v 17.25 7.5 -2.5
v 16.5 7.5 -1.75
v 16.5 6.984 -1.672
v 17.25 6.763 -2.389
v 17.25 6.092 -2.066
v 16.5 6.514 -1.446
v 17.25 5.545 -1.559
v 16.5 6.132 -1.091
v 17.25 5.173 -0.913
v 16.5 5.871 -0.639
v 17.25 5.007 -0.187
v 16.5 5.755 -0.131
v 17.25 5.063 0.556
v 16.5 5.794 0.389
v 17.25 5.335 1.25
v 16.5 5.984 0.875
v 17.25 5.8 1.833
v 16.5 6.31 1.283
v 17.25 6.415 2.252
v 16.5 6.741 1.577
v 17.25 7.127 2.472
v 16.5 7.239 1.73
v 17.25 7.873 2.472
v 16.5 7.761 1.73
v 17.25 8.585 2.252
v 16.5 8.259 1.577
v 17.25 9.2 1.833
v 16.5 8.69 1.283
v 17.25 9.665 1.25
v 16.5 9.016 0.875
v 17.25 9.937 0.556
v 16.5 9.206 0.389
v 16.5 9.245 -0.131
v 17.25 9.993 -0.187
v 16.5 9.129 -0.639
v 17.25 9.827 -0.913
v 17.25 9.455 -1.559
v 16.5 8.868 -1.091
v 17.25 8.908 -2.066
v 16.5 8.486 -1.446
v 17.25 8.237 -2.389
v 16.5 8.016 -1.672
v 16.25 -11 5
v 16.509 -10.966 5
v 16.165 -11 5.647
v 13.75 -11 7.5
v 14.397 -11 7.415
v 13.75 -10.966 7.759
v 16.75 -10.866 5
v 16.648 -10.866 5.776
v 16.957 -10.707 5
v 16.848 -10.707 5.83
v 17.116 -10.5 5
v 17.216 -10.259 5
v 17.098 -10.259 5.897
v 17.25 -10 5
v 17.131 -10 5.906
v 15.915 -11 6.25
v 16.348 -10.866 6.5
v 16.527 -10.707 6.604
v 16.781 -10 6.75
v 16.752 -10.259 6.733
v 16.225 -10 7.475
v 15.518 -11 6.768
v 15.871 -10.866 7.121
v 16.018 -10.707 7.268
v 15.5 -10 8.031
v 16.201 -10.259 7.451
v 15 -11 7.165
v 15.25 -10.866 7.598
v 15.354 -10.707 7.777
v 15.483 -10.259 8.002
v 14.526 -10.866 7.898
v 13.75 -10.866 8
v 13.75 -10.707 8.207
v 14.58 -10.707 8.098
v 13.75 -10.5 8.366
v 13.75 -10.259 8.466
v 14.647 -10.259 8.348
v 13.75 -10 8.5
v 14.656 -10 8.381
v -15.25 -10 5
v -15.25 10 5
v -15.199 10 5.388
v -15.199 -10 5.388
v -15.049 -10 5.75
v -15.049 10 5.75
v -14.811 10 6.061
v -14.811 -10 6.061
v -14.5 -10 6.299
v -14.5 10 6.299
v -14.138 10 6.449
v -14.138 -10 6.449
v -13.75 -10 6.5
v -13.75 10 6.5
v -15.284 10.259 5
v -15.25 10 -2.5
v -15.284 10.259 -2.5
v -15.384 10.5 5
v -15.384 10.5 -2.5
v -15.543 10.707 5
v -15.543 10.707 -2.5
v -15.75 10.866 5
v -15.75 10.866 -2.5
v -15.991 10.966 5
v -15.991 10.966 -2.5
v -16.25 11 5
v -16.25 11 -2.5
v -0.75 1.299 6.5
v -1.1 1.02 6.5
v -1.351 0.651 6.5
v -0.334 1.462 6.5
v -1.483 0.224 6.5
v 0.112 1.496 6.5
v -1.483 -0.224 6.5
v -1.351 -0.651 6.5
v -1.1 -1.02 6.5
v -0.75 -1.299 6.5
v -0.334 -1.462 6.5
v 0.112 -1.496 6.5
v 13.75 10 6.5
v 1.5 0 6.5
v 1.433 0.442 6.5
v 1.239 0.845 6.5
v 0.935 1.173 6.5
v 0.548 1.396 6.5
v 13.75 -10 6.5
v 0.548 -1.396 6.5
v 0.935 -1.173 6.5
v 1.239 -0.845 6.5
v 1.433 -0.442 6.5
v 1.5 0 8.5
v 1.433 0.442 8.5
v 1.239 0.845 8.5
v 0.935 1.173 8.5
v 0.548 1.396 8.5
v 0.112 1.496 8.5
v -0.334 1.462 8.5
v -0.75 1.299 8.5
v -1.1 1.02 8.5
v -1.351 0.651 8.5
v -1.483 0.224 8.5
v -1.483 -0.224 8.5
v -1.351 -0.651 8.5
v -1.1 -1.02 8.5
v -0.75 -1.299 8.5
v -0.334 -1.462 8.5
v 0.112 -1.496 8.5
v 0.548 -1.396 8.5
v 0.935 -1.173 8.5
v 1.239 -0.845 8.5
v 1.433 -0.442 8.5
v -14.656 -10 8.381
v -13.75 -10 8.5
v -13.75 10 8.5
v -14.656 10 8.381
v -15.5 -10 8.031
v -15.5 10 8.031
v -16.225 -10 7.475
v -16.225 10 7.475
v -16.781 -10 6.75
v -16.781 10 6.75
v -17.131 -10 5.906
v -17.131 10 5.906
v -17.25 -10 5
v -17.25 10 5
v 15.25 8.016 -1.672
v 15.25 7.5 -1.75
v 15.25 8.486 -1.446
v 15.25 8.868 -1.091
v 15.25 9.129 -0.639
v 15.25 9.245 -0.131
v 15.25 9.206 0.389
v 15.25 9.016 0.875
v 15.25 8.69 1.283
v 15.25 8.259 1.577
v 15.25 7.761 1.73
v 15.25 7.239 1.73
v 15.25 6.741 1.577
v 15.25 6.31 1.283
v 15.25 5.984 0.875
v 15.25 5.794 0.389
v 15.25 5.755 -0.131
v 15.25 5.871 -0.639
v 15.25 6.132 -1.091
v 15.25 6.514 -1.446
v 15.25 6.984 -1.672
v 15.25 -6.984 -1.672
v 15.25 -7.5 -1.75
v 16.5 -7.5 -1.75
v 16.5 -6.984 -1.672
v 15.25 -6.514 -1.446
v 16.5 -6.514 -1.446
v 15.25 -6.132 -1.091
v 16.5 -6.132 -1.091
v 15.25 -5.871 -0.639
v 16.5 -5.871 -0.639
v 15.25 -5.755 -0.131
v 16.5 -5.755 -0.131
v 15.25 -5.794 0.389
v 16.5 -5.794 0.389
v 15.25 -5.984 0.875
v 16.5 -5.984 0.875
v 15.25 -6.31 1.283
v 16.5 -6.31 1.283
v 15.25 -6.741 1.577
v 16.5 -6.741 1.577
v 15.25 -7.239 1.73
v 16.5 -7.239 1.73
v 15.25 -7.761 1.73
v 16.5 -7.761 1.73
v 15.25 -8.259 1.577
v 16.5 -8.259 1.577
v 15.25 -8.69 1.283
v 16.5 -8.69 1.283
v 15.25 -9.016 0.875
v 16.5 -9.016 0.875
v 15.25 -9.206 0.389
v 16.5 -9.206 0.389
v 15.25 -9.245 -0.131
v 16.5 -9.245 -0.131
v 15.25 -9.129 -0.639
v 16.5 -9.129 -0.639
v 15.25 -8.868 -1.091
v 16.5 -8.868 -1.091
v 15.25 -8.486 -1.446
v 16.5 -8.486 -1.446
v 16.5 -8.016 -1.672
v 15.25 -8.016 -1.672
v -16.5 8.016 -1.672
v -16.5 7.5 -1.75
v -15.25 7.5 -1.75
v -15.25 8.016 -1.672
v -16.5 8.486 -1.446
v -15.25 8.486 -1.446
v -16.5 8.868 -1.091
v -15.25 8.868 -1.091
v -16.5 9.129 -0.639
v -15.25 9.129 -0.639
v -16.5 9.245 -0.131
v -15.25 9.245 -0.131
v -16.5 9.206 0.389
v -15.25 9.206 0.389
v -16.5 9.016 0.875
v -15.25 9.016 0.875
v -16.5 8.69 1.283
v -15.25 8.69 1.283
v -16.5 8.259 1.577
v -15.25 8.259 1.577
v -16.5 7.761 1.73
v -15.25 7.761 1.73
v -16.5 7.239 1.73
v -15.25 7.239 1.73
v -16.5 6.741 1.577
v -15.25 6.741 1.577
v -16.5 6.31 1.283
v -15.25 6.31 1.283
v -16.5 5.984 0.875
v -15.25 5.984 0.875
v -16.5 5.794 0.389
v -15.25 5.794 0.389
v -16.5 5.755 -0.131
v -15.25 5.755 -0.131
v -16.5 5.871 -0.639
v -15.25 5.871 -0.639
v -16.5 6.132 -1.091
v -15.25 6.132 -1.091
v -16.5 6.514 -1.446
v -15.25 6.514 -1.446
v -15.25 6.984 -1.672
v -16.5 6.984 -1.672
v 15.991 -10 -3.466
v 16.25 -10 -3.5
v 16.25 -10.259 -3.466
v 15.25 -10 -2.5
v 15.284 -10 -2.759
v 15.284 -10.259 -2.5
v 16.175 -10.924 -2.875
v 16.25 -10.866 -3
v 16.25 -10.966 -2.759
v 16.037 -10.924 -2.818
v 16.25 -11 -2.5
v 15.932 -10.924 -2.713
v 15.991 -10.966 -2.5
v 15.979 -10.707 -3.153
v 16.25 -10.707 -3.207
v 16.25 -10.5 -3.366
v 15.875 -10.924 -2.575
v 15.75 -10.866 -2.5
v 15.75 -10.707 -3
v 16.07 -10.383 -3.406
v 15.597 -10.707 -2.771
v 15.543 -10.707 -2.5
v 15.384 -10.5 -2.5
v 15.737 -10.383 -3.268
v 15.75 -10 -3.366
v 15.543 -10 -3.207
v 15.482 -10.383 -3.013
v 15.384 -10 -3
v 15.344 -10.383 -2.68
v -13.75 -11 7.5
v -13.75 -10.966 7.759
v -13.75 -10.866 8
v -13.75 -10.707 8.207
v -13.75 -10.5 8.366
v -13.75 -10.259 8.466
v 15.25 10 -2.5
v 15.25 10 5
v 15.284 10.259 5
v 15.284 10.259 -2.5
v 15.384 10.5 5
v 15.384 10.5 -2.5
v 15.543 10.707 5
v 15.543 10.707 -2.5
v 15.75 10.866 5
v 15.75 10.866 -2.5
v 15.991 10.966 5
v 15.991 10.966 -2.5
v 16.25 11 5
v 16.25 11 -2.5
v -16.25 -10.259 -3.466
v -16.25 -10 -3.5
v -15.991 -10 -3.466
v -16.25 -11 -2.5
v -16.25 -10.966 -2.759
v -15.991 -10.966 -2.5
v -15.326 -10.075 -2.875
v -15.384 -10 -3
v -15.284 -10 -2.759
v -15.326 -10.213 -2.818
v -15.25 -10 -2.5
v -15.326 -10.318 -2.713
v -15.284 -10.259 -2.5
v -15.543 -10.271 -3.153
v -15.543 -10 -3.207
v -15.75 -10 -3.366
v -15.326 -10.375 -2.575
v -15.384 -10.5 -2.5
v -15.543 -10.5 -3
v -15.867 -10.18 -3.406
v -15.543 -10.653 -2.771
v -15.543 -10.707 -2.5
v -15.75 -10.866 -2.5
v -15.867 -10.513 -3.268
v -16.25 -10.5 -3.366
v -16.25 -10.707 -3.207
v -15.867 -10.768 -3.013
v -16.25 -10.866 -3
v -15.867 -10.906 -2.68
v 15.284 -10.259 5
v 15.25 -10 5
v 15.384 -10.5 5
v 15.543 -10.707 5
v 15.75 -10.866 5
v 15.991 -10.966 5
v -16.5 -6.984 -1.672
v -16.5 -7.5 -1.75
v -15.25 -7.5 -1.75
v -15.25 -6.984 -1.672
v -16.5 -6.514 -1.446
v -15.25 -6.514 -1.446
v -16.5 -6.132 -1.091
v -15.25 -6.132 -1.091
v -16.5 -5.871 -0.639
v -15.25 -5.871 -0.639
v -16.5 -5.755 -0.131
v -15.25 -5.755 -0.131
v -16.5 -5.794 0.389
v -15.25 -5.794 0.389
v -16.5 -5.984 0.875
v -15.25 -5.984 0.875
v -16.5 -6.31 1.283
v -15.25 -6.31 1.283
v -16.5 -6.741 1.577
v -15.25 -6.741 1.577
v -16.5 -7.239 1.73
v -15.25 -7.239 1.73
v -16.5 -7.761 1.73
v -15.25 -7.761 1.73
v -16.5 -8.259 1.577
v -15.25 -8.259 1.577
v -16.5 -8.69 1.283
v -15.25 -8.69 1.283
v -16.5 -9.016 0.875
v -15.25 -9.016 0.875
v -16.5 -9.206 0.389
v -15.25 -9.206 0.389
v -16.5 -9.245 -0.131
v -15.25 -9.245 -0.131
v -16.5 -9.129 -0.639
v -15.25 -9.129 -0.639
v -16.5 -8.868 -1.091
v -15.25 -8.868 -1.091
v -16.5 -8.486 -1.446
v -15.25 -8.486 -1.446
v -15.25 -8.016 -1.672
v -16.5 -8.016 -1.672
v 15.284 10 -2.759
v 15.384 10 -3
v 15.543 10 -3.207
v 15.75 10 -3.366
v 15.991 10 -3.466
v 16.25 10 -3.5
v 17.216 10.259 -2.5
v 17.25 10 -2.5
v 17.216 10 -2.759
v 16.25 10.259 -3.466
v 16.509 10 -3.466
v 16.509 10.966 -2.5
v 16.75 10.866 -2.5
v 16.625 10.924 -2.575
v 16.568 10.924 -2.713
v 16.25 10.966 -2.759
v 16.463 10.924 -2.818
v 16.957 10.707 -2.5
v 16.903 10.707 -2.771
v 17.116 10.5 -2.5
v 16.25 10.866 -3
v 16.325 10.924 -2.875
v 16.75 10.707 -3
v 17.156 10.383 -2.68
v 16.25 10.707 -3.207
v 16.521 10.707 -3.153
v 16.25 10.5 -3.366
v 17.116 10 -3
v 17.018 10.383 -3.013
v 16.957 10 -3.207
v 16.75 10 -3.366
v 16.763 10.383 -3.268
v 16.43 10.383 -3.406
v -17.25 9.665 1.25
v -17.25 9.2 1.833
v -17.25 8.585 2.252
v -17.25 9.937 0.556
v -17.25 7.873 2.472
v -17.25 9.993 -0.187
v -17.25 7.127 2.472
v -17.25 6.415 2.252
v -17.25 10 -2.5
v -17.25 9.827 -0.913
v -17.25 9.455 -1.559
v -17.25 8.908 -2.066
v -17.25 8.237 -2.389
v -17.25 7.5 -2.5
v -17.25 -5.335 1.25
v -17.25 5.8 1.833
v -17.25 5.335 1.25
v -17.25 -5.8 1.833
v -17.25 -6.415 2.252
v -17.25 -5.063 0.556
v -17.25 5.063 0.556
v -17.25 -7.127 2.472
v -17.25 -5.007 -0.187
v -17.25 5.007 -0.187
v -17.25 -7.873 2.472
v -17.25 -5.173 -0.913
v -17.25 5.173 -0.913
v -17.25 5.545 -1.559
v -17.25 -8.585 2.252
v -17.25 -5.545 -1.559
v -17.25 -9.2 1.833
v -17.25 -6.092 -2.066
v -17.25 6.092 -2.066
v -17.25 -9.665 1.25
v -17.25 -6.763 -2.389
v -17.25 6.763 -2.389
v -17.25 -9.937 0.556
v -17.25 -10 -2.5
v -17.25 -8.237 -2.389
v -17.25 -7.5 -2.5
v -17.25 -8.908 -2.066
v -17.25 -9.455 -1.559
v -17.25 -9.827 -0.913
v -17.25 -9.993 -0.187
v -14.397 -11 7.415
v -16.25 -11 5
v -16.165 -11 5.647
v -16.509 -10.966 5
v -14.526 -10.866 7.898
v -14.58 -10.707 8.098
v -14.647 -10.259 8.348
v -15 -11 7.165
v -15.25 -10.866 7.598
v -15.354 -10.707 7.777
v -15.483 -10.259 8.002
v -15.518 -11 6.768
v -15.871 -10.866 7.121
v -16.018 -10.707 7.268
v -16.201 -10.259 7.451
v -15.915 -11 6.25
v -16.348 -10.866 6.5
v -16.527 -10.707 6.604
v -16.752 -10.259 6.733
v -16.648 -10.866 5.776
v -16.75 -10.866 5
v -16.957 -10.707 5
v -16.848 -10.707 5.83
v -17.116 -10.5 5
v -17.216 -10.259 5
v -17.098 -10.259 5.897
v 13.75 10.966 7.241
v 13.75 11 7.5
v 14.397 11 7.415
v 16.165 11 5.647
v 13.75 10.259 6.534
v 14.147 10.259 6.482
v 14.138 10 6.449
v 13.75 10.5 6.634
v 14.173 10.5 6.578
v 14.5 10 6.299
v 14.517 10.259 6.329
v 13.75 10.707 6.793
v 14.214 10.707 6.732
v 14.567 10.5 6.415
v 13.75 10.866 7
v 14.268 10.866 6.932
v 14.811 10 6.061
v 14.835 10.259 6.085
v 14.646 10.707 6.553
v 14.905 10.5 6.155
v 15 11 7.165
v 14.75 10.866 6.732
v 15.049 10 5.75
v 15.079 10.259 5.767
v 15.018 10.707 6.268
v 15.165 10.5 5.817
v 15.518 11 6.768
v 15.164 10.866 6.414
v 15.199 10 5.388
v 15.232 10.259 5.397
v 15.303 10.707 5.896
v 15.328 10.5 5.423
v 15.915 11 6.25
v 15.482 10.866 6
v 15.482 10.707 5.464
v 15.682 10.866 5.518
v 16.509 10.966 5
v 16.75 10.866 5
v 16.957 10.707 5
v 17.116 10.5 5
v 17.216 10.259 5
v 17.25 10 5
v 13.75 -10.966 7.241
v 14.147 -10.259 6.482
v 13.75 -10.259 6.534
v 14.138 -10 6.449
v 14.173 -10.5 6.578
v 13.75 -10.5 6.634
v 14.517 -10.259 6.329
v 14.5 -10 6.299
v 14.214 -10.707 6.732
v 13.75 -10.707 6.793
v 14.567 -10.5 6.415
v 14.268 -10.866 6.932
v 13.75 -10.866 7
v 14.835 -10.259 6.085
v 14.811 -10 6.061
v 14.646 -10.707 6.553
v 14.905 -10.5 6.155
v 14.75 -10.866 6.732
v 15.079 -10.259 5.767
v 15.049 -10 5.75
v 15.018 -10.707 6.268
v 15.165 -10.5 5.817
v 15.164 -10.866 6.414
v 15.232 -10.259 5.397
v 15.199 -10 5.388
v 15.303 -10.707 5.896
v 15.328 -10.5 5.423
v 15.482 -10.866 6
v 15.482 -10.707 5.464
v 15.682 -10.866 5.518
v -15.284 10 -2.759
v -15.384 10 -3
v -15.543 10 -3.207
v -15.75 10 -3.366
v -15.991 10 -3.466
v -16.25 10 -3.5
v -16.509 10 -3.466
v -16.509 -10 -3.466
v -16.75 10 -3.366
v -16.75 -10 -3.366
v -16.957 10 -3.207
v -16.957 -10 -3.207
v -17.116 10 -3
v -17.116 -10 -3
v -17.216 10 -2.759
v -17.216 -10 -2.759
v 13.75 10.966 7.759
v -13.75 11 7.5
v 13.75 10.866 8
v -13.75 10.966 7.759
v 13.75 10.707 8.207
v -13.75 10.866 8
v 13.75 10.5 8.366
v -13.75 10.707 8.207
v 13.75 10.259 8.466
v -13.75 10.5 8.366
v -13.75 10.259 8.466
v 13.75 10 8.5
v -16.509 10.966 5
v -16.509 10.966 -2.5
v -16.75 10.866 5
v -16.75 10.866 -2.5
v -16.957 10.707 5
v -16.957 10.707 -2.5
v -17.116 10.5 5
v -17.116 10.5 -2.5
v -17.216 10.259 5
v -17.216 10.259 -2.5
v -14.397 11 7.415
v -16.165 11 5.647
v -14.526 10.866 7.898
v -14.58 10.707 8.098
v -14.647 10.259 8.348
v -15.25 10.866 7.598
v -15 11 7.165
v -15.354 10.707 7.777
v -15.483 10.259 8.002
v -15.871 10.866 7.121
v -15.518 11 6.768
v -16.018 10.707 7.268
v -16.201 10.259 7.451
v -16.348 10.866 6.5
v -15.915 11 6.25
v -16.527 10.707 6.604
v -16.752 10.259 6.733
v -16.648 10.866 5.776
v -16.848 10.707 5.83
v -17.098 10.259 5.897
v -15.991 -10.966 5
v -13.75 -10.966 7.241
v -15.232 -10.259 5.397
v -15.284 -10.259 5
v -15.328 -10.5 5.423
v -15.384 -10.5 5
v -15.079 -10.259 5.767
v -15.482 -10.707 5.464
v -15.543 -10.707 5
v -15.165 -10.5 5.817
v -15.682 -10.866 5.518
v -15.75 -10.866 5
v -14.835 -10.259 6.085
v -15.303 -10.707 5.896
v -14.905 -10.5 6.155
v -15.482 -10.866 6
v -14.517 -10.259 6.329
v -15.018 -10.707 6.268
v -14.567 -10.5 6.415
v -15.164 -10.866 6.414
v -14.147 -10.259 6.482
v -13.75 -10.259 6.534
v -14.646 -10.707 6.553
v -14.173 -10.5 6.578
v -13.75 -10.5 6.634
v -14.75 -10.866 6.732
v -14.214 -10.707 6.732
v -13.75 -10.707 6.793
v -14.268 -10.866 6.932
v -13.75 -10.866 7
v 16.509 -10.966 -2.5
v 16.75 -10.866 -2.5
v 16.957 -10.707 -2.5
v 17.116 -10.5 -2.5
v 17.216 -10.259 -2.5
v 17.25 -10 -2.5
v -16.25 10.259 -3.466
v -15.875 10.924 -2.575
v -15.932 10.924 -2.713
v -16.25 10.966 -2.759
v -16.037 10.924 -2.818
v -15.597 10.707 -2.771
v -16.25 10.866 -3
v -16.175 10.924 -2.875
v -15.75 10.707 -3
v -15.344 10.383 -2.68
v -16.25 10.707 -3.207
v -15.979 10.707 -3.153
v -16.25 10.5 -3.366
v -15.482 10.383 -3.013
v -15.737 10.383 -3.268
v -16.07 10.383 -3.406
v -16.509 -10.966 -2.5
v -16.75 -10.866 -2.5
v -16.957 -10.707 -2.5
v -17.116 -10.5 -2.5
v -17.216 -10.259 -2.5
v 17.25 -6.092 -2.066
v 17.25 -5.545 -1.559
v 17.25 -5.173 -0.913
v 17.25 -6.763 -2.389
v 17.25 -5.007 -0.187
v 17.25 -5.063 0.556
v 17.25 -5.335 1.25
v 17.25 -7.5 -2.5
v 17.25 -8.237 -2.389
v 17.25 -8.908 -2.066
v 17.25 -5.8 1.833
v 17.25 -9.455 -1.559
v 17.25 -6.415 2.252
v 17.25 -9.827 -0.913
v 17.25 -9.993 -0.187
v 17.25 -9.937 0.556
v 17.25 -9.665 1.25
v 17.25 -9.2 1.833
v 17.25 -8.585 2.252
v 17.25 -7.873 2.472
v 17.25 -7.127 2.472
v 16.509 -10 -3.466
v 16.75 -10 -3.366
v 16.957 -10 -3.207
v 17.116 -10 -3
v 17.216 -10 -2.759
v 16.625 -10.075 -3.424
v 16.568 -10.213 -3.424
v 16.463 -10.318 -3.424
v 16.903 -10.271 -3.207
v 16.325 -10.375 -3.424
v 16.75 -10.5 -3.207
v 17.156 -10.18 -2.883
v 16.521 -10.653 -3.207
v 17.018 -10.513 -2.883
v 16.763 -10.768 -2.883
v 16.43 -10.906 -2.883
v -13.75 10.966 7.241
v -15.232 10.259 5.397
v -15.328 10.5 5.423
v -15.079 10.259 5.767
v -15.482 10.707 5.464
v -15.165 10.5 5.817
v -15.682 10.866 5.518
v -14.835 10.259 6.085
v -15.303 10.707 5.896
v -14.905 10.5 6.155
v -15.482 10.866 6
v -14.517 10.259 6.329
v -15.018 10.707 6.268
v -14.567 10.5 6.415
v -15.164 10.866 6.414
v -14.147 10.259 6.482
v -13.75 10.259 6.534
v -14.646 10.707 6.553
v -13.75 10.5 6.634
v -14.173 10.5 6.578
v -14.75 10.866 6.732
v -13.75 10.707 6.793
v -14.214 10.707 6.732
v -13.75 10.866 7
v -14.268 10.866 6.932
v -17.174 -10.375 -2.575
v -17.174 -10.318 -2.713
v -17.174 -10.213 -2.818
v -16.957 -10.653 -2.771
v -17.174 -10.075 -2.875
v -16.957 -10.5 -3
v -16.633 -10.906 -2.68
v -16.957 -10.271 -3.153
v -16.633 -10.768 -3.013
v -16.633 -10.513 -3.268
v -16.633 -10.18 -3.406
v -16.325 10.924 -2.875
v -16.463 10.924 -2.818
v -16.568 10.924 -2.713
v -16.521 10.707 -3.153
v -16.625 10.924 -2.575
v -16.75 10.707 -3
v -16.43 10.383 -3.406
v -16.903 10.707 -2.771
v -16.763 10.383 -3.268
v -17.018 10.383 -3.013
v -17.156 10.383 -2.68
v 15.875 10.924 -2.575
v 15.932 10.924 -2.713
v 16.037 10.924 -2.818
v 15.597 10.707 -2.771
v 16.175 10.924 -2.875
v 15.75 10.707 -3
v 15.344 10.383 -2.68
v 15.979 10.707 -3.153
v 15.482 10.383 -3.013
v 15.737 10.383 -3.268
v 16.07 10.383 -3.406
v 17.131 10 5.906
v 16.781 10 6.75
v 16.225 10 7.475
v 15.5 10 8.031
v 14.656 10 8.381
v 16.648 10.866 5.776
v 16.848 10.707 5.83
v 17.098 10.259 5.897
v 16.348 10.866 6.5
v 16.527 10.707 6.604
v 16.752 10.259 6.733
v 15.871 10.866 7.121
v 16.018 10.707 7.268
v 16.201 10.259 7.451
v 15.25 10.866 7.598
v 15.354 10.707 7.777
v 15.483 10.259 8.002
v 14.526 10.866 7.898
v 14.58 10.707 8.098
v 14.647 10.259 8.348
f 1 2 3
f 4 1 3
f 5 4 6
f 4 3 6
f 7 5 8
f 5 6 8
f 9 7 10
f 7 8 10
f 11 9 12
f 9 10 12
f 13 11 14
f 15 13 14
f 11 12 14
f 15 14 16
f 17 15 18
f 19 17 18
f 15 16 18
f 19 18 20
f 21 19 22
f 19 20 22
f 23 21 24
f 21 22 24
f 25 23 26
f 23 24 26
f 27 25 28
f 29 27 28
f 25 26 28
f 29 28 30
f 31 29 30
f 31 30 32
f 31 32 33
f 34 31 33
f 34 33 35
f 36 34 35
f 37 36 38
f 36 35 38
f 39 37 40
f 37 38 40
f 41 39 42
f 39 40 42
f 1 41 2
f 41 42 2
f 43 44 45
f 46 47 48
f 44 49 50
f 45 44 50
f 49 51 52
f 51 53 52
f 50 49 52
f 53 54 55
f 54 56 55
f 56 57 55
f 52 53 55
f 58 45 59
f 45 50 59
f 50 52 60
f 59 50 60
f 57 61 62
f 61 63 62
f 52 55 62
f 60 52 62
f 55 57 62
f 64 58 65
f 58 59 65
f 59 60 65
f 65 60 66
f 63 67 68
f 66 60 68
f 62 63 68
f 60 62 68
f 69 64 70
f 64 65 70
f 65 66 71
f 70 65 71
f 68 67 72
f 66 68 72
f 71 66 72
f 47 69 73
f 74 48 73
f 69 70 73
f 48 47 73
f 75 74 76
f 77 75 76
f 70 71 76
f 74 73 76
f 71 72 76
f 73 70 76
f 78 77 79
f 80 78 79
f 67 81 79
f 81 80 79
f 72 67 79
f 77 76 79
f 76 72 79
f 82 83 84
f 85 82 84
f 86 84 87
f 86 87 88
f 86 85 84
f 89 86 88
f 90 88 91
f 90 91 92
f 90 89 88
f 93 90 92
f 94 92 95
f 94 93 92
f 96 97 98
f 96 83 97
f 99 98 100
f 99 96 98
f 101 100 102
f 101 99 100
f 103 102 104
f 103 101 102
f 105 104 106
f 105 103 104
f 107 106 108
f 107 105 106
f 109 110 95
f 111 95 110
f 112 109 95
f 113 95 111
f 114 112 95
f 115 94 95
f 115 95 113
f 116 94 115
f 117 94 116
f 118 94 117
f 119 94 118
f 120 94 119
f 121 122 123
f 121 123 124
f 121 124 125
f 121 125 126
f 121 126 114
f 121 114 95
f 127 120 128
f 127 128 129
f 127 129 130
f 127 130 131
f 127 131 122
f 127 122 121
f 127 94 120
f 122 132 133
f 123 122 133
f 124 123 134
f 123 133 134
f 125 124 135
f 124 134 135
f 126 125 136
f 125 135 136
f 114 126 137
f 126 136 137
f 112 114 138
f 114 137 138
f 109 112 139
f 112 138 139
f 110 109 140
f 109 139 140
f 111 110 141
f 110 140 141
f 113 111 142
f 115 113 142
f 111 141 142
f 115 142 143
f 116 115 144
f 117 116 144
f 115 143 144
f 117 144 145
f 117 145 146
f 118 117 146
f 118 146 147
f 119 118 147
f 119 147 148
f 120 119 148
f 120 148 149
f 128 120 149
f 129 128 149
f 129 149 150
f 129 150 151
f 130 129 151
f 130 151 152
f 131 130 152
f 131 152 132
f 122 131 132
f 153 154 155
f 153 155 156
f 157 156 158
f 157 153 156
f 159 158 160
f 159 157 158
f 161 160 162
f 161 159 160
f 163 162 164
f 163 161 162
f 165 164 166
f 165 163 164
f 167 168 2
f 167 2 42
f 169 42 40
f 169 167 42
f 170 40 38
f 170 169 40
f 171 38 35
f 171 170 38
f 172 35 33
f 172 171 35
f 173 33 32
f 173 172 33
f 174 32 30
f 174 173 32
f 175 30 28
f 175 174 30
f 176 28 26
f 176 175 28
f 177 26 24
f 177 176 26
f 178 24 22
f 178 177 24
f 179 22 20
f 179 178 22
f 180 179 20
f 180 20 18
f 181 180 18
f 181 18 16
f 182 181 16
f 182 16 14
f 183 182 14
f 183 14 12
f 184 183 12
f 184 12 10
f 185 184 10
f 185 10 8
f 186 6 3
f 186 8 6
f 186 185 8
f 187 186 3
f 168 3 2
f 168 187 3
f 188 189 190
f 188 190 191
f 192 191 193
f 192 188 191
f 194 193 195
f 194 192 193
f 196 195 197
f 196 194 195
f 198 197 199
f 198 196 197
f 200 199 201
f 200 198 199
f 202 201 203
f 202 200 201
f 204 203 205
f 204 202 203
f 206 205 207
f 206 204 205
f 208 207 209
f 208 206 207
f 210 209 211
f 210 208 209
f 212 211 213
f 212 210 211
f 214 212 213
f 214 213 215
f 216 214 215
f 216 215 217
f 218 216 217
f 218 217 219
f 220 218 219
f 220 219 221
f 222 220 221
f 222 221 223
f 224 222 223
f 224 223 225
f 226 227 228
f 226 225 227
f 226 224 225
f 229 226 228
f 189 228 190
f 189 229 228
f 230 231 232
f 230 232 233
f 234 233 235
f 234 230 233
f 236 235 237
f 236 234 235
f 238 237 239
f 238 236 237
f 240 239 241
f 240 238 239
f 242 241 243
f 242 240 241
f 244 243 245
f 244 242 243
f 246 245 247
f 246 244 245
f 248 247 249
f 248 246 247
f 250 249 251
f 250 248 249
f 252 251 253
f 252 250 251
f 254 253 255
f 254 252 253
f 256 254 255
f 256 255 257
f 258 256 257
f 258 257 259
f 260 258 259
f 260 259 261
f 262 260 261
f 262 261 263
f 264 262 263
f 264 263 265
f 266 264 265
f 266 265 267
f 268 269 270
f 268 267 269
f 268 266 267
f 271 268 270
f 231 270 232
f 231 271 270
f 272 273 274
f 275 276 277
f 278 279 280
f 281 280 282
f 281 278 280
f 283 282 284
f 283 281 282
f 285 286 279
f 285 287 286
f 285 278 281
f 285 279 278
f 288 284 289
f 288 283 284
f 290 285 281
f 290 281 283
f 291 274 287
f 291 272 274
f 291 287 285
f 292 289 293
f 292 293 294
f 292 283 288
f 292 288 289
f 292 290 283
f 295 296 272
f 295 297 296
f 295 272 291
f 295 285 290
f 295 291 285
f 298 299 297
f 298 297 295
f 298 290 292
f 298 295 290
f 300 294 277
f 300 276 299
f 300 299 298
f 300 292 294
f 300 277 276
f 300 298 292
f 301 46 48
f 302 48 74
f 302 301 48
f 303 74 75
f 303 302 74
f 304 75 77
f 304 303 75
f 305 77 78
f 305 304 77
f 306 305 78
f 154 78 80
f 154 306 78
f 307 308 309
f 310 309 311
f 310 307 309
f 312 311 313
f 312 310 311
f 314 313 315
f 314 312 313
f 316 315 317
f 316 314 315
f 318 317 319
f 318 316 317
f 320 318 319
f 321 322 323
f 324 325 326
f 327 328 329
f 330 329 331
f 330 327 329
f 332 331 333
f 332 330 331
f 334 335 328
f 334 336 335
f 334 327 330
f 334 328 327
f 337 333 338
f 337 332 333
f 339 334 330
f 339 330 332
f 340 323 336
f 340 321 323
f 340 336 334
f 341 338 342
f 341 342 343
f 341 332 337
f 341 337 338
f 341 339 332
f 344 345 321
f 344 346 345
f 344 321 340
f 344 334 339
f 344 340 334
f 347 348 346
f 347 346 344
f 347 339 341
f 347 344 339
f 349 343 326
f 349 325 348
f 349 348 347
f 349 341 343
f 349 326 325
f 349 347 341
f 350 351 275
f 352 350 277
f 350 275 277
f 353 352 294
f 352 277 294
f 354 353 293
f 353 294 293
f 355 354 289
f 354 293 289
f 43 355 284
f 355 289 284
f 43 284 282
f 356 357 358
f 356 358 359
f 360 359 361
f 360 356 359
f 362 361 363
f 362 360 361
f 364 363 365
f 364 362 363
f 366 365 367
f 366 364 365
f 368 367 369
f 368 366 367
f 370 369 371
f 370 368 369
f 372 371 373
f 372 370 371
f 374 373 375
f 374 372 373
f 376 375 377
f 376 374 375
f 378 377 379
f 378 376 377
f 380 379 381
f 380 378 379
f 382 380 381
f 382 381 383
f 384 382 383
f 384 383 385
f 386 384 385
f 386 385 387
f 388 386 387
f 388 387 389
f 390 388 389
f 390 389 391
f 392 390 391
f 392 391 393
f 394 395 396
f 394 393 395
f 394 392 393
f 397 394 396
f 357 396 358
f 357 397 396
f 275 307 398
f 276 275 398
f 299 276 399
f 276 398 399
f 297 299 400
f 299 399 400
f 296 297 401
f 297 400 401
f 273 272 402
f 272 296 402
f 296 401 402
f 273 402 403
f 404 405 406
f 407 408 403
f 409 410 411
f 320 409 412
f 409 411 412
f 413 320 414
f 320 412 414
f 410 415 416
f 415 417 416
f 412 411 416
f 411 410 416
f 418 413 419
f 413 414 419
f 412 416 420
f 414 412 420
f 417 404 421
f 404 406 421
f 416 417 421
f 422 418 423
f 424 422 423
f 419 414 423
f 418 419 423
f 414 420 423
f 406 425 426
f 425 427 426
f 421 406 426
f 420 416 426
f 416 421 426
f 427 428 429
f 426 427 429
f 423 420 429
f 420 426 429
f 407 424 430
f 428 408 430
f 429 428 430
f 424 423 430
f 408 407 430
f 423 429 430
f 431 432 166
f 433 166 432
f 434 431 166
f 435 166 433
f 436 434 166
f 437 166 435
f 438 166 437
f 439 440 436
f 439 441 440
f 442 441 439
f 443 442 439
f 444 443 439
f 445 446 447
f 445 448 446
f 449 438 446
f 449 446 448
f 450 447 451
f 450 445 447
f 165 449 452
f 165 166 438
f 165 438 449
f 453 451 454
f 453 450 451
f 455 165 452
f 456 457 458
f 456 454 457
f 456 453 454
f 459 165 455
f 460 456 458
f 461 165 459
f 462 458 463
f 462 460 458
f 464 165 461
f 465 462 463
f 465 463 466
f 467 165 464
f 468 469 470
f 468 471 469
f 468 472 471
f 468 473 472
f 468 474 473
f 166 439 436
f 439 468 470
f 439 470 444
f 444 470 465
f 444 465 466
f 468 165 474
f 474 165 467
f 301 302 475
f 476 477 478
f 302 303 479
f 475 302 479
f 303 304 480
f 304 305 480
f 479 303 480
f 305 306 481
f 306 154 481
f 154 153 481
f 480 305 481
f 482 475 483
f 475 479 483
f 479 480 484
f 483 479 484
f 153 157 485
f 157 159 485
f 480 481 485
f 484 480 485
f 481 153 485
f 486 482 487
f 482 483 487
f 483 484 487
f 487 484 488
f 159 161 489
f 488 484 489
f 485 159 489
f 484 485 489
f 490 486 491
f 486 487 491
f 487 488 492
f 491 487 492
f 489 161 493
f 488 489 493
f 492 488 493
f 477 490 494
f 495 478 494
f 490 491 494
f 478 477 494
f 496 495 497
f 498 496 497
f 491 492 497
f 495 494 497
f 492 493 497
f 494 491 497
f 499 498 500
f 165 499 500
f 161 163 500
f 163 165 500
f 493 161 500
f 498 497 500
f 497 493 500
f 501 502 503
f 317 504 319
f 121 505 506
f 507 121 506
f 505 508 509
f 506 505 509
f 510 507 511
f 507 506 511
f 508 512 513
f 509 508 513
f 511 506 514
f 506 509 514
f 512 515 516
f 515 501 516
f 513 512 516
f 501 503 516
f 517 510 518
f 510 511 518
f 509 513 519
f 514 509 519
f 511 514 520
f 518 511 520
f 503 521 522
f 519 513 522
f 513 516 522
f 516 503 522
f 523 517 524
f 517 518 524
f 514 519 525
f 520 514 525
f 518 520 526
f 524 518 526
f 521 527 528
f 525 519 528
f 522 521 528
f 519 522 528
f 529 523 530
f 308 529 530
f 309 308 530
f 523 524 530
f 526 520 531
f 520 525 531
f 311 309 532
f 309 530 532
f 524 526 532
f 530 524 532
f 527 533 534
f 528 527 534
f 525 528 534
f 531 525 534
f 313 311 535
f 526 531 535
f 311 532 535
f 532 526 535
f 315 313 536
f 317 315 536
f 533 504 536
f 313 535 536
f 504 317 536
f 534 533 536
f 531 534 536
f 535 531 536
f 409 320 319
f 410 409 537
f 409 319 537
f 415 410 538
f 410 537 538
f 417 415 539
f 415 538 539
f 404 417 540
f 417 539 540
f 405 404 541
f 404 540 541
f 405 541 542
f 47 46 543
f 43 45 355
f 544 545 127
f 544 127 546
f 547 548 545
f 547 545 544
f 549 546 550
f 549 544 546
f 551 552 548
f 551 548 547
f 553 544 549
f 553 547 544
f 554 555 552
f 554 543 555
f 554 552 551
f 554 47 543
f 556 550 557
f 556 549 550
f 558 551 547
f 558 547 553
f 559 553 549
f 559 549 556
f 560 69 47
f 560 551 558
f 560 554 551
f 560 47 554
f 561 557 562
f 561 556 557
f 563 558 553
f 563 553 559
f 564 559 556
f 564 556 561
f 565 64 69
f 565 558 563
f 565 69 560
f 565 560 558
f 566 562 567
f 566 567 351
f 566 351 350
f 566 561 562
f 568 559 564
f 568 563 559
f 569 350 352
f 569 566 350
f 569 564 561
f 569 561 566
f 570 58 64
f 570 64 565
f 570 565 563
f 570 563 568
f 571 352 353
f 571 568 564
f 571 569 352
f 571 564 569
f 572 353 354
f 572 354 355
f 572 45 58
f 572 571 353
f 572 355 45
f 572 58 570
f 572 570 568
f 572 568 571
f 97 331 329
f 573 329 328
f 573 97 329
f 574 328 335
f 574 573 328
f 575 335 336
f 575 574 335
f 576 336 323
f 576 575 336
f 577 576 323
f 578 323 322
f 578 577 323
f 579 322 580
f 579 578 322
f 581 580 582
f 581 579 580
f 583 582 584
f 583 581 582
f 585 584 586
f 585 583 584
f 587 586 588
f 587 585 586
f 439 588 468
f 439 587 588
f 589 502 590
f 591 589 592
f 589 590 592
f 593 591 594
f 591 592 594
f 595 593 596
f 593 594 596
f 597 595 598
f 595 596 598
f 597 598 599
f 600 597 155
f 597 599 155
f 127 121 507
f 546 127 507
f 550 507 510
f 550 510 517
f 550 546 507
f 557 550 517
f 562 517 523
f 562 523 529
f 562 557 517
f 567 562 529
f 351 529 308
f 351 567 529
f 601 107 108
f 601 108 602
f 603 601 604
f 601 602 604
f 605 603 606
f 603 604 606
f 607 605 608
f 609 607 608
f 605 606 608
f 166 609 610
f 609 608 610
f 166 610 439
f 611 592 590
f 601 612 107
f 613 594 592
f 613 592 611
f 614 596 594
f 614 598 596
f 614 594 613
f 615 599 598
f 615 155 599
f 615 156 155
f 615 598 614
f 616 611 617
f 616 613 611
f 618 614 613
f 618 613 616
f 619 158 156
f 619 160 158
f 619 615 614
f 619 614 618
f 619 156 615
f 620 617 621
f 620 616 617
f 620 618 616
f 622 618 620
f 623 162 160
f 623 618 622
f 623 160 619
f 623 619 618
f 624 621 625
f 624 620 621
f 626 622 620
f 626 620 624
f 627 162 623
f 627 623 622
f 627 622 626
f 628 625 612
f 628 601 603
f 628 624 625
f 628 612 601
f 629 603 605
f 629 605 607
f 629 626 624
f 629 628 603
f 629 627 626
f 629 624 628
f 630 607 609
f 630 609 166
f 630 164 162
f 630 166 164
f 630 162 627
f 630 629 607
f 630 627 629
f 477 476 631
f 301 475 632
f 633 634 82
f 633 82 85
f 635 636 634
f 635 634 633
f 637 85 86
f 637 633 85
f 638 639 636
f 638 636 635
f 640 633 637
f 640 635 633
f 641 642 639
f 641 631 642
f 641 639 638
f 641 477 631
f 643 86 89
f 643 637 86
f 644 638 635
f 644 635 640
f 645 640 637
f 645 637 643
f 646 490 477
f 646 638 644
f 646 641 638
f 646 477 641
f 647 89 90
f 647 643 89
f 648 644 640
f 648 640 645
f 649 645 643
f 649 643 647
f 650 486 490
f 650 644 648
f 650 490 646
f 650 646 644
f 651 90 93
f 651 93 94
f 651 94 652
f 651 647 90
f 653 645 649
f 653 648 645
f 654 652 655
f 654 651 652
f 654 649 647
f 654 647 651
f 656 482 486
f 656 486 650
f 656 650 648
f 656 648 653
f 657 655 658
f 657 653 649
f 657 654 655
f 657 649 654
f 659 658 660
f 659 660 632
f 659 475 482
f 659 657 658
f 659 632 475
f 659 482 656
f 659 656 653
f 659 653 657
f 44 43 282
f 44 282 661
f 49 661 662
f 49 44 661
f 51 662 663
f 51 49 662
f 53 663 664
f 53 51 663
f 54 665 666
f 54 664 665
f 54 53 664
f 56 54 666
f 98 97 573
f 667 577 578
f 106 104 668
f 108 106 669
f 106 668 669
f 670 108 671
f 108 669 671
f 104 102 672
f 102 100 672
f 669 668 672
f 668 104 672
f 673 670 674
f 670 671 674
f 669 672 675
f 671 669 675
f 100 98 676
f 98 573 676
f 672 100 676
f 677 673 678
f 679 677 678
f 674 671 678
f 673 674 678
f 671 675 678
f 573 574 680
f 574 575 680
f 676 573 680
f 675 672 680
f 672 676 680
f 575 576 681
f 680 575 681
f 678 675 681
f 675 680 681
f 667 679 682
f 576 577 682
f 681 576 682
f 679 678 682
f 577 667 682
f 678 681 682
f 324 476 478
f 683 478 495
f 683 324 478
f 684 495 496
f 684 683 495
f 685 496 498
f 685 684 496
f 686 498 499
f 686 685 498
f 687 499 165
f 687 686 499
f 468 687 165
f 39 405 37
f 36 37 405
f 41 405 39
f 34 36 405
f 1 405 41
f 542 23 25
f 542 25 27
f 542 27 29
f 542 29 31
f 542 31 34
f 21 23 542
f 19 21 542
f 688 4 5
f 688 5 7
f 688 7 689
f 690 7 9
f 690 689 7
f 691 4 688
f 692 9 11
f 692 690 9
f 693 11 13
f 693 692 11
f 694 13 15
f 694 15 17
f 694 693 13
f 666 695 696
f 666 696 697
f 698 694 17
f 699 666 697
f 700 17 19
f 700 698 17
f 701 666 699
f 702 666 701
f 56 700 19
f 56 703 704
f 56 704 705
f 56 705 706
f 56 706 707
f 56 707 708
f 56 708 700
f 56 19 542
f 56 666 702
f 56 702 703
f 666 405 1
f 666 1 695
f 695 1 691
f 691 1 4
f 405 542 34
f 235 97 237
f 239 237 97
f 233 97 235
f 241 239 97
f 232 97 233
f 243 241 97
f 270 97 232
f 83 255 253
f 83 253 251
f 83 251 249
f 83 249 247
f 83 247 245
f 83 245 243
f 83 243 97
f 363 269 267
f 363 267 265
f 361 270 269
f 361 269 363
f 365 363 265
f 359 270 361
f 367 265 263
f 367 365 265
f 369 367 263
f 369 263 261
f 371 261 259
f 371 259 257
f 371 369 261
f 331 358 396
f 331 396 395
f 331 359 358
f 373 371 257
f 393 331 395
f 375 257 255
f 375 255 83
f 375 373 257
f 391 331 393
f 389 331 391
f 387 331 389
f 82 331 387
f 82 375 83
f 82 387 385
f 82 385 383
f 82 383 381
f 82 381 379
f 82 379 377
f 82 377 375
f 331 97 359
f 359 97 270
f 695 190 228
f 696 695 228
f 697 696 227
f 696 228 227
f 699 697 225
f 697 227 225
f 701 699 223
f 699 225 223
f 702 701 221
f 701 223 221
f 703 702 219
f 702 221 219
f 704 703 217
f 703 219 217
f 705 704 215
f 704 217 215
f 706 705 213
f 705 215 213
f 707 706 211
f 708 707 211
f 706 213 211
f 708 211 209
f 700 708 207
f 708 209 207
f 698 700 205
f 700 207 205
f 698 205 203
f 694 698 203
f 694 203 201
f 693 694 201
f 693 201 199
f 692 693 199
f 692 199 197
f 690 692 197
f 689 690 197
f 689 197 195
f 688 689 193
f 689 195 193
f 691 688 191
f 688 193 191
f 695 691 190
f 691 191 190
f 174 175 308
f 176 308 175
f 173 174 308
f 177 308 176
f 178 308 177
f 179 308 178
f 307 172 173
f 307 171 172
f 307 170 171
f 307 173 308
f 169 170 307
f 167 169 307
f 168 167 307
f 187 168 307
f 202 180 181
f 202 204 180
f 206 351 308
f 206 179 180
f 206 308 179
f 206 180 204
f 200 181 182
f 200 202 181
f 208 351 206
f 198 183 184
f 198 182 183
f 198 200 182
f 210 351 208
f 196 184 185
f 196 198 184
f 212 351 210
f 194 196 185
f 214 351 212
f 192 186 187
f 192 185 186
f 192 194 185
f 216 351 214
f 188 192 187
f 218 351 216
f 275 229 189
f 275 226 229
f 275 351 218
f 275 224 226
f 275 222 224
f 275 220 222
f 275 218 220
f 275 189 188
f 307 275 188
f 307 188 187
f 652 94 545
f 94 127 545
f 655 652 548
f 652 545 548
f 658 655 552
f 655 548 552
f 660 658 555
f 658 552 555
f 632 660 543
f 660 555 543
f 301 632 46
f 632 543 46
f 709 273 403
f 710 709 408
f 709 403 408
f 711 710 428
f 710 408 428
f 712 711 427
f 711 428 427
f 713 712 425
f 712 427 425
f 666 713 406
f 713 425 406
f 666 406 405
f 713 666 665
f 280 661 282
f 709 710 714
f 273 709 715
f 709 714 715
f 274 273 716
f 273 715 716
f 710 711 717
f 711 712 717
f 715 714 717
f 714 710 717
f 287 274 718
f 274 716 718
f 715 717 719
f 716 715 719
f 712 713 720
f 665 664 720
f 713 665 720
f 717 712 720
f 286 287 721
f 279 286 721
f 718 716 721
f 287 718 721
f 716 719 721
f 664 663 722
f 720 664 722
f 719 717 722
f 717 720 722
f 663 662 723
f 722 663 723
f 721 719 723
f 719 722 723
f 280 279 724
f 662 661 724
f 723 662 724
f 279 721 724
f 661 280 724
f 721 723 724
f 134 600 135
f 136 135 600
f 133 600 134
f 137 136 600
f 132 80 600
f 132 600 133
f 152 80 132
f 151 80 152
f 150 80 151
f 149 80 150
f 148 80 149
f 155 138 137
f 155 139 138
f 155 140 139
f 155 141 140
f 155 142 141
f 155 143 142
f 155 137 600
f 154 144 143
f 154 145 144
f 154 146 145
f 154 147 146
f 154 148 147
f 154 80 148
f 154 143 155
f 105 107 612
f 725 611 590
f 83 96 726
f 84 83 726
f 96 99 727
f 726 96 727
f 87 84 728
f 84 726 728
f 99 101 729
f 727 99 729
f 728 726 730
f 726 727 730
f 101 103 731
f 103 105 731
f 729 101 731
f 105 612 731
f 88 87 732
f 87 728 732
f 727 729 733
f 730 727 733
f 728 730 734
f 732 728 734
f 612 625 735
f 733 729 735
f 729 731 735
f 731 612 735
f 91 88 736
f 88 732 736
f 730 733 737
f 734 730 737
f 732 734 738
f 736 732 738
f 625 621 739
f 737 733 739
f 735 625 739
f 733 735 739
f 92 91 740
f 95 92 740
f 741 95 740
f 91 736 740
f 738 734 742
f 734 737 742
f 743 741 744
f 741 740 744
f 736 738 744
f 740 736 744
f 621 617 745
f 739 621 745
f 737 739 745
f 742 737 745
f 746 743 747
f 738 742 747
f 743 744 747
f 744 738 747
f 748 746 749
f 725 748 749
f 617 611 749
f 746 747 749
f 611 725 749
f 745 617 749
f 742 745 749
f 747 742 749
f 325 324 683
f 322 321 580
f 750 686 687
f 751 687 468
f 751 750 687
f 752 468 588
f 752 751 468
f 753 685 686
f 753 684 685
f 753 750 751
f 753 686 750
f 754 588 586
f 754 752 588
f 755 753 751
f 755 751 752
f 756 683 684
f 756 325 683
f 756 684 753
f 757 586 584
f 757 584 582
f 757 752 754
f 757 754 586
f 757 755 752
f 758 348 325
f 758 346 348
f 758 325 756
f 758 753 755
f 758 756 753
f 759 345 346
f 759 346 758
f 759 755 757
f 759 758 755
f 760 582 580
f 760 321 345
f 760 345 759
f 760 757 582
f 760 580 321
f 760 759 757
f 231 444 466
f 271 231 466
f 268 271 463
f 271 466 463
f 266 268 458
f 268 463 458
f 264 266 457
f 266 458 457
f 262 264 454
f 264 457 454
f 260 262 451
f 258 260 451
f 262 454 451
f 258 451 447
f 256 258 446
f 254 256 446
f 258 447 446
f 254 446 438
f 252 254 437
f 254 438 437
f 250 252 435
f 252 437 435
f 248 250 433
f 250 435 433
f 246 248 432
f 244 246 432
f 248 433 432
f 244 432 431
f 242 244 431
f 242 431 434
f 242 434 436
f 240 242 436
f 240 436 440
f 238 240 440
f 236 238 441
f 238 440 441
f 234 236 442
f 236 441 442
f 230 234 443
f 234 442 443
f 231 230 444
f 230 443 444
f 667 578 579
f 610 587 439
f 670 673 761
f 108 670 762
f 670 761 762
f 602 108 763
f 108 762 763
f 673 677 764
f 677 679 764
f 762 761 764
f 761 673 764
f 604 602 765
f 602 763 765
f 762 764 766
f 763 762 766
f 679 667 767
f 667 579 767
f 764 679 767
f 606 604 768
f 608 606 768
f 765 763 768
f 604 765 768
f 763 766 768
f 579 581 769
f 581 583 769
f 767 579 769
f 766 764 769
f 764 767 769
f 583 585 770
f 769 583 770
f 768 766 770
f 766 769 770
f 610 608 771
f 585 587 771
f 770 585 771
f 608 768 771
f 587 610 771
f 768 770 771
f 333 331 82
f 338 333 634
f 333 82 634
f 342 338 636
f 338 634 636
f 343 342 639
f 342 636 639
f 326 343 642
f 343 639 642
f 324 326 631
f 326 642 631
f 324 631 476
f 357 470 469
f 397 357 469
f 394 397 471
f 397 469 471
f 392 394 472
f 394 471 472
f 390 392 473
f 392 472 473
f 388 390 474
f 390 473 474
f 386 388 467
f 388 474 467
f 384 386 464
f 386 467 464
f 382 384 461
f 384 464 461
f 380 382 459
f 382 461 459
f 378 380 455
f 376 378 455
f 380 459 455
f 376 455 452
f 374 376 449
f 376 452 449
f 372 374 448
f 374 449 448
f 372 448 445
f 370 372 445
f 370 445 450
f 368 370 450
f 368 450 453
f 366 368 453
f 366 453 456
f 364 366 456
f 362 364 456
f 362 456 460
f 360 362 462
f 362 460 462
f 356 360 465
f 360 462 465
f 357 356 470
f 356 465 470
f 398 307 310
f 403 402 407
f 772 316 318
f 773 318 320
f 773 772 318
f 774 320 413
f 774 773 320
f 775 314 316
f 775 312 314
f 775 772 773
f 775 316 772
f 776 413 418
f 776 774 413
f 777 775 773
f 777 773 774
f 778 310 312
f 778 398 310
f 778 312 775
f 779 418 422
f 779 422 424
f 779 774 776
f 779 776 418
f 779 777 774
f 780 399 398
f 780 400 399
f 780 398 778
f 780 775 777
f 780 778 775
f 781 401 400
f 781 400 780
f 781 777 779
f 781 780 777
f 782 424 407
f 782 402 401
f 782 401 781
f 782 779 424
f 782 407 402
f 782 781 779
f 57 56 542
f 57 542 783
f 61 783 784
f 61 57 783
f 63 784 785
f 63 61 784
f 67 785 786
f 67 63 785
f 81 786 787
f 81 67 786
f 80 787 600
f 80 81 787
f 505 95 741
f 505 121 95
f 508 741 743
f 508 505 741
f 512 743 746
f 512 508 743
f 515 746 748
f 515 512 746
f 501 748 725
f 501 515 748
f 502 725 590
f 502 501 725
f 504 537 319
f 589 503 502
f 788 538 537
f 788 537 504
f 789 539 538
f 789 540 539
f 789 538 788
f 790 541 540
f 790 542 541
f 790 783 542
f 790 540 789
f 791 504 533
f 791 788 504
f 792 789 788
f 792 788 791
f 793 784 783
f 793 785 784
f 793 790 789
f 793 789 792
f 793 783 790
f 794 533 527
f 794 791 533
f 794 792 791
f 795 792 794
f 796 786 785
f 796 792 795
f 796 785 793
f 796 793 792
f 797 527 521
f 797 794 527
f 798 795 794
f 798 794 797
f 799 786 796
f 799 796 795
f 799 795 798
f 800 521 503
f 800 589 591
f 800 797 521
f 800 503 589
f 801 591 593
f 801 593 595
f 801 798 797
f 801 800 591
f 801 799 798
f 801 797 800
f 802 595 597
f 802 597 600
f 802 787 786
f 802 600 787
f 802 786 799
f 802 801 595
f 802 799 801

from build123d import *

# Parameters (mm, degrees)
BOSS_EXTRUDE1_DEPTH      = 11
BOSS_EXTRUDE1_DEPTH_BACK = 11
CUT_EXTRUDE1_DEPTH       = 23.154288524
CUT_EXTRUDE1_DEPTH_BACK  = 23.154288524
SKETCH2_R                = 1.75
CUT_EXTRUDE2_REACH       = 25.718
SKETCH3_R                = 1.5
FILLET1_R                = 1
CHAMFER1_SIZE            = 0.75


with BuildPart() as part:
    # Sketch1 → Boss-Extrude1 (new, two sides: drawn at the far end of the back side and taken through both)
    with BuildSketch(Plane(origin=(0, 0, 0), x_dir=(1, 0, 0), z_dir=(0, 1, 0)).offset(-BOSS_EXTRUDE1_DEPTH_BACK)):
        with BuildLine():
            Line((-15.25, 0), (-15.25, -5))
            ThreePointArc((-15.25, -5), (-14.810660172, -6.060660172), (-13.75, -6.5))
            Line((-13.75, -6.5), (13.75, -6.5))
            ThreePointArc((13.75, -6.5), (14.810660172, -6.060660172), (15.25, -5))
            Line((15.25, -5), (15.25, 0))
            Line((15.25, 0), (15.25, 3.5))
            Line((15.25, 3.5), (17.25, 3.5))
            Line((17.25, 3.5), (17.25, 0))
            Line((17.25, 0), (17.25, -5))
            ThreePointArc((17.25, -5), (16.224873734, -7.474873734), (13.75, -8.5))
            Line((13.75, -8.5), (-13.75, -8.5))
            ThreePointArc((-13.75, -8.5), (-16.224873734, -7.474873734), (-17.25, -5))
            Line((-17.25, -5), (-17.25, 0))
            Line((-17.25, 0), (-17.25, 3.5))
            Line((-17.25, 3.5), (-15.25, 3.5))
            Line((-15.25, 3.5), (-15.25, 0))
        make_face()
    extrude(amount=BOSS_EXTRUDE1_DEPTH + BOSS_EXTRUDE1_DEPTH_BACK)

    # Sketch2 → Cut-Extrude1 (cut, two sides: drawn at the far end of the back side and taken through both)
    with BuildSketch(Plane(origin=(0, 0, 0), x_dir=(0, 0, -1), z_dir=(1, 0, 0)).offset(-CUT_EXTRUDE1_DEPTH_BACK)):
        with Locations((0, 7.5)):
            Circle(SKETCH2_R)
        with Locations((0, -7.5)):
            Circle(SKETCH2_R)
    extrude(amount=CUT_EXTRUDE1_DEPTH + CUT_EXTRUDE1_DEPTH_BACK, mode=Mode.SUBTRACT)

    # Sketch3 → Cut-Extrude2 (cut, up to next)
    with BuildSketch(Plane.XY.offset(8.5), mode=Mode.PRIVATE) as cut_extrude2_sk1:
        Circle(SKETCH3_R)
    cut_extrude2_tool1 = extrude(cut_extrude2_sk1.sketch, amount=-CUT_EXTRUDE2_REACH, mode=Mode.PRIVATE) & part.part
    add(cut_extrude2_tool1.solids().sort_by_distance((0, 0, 8.5))[0], mode=Mode.SUBTRACT)

    # Fillet1
    fillet1_edges = [part.edges().sort_by_distance(p)[0] for p in [
        (-16.25, -11, -3.5),
        (-17.25, -11, 0.75),
        (-16.224873734, -11, 7.474873734),
        (0, -11, 8.5),
        (15.25, 0, -3.5),
        (17.25, 0, -3.5),
        (-17.25, 0, -3.5),
        (-15.25, 0, -3.5),
        (16.224873734, -11, 7.474873734),
        (17.25, -11, 0.75),
        (16.25, -11, -3.5),
        (-14.810660172, -11, 6.060660172),
        (15.25, -11, 0.75),
        (-14.810660172, 11, 6.060660172),
        (-15.25, 11, 0.75),
        (-16.25, 11, -3.5),
        (-17.25, 11, 0.75),
        (14.810660172, -11, 6.060660172),
        (-16.224873734, 11, 7.474873734),
        (0, 11, 8.5),
        (16.224873734, 11, 7.474873734),
        (17.25, 11, 0.75),
        (16.25, 11, -3.5),
        (15.25, 11, 0.75),
        (14.810660172, 11, 6.060660172),
        (0, 11, 6.5),
        (0, -11, 6.5),
        (-15.25, -11, 0.75),
    ]]
    fillet(fillet1_edges, radius=FILLET1_R - 0.0001)  # a hair under: the kernel refuses the full size

    # Chamfer1
    chamfer1_edges = [part.edges().sort_by_distance(p)[0] for p in [
        (-17.25, 7.5, 1.75),
        (17.25, 7.5, 1.75),
        (-17.25, -7.5, 1.75),
        (17.25, -7.5, 1.75),
    ]]
    chamfer(chamfer1_edges, length=CHAMFER1_SIZE)


solid = part.part
